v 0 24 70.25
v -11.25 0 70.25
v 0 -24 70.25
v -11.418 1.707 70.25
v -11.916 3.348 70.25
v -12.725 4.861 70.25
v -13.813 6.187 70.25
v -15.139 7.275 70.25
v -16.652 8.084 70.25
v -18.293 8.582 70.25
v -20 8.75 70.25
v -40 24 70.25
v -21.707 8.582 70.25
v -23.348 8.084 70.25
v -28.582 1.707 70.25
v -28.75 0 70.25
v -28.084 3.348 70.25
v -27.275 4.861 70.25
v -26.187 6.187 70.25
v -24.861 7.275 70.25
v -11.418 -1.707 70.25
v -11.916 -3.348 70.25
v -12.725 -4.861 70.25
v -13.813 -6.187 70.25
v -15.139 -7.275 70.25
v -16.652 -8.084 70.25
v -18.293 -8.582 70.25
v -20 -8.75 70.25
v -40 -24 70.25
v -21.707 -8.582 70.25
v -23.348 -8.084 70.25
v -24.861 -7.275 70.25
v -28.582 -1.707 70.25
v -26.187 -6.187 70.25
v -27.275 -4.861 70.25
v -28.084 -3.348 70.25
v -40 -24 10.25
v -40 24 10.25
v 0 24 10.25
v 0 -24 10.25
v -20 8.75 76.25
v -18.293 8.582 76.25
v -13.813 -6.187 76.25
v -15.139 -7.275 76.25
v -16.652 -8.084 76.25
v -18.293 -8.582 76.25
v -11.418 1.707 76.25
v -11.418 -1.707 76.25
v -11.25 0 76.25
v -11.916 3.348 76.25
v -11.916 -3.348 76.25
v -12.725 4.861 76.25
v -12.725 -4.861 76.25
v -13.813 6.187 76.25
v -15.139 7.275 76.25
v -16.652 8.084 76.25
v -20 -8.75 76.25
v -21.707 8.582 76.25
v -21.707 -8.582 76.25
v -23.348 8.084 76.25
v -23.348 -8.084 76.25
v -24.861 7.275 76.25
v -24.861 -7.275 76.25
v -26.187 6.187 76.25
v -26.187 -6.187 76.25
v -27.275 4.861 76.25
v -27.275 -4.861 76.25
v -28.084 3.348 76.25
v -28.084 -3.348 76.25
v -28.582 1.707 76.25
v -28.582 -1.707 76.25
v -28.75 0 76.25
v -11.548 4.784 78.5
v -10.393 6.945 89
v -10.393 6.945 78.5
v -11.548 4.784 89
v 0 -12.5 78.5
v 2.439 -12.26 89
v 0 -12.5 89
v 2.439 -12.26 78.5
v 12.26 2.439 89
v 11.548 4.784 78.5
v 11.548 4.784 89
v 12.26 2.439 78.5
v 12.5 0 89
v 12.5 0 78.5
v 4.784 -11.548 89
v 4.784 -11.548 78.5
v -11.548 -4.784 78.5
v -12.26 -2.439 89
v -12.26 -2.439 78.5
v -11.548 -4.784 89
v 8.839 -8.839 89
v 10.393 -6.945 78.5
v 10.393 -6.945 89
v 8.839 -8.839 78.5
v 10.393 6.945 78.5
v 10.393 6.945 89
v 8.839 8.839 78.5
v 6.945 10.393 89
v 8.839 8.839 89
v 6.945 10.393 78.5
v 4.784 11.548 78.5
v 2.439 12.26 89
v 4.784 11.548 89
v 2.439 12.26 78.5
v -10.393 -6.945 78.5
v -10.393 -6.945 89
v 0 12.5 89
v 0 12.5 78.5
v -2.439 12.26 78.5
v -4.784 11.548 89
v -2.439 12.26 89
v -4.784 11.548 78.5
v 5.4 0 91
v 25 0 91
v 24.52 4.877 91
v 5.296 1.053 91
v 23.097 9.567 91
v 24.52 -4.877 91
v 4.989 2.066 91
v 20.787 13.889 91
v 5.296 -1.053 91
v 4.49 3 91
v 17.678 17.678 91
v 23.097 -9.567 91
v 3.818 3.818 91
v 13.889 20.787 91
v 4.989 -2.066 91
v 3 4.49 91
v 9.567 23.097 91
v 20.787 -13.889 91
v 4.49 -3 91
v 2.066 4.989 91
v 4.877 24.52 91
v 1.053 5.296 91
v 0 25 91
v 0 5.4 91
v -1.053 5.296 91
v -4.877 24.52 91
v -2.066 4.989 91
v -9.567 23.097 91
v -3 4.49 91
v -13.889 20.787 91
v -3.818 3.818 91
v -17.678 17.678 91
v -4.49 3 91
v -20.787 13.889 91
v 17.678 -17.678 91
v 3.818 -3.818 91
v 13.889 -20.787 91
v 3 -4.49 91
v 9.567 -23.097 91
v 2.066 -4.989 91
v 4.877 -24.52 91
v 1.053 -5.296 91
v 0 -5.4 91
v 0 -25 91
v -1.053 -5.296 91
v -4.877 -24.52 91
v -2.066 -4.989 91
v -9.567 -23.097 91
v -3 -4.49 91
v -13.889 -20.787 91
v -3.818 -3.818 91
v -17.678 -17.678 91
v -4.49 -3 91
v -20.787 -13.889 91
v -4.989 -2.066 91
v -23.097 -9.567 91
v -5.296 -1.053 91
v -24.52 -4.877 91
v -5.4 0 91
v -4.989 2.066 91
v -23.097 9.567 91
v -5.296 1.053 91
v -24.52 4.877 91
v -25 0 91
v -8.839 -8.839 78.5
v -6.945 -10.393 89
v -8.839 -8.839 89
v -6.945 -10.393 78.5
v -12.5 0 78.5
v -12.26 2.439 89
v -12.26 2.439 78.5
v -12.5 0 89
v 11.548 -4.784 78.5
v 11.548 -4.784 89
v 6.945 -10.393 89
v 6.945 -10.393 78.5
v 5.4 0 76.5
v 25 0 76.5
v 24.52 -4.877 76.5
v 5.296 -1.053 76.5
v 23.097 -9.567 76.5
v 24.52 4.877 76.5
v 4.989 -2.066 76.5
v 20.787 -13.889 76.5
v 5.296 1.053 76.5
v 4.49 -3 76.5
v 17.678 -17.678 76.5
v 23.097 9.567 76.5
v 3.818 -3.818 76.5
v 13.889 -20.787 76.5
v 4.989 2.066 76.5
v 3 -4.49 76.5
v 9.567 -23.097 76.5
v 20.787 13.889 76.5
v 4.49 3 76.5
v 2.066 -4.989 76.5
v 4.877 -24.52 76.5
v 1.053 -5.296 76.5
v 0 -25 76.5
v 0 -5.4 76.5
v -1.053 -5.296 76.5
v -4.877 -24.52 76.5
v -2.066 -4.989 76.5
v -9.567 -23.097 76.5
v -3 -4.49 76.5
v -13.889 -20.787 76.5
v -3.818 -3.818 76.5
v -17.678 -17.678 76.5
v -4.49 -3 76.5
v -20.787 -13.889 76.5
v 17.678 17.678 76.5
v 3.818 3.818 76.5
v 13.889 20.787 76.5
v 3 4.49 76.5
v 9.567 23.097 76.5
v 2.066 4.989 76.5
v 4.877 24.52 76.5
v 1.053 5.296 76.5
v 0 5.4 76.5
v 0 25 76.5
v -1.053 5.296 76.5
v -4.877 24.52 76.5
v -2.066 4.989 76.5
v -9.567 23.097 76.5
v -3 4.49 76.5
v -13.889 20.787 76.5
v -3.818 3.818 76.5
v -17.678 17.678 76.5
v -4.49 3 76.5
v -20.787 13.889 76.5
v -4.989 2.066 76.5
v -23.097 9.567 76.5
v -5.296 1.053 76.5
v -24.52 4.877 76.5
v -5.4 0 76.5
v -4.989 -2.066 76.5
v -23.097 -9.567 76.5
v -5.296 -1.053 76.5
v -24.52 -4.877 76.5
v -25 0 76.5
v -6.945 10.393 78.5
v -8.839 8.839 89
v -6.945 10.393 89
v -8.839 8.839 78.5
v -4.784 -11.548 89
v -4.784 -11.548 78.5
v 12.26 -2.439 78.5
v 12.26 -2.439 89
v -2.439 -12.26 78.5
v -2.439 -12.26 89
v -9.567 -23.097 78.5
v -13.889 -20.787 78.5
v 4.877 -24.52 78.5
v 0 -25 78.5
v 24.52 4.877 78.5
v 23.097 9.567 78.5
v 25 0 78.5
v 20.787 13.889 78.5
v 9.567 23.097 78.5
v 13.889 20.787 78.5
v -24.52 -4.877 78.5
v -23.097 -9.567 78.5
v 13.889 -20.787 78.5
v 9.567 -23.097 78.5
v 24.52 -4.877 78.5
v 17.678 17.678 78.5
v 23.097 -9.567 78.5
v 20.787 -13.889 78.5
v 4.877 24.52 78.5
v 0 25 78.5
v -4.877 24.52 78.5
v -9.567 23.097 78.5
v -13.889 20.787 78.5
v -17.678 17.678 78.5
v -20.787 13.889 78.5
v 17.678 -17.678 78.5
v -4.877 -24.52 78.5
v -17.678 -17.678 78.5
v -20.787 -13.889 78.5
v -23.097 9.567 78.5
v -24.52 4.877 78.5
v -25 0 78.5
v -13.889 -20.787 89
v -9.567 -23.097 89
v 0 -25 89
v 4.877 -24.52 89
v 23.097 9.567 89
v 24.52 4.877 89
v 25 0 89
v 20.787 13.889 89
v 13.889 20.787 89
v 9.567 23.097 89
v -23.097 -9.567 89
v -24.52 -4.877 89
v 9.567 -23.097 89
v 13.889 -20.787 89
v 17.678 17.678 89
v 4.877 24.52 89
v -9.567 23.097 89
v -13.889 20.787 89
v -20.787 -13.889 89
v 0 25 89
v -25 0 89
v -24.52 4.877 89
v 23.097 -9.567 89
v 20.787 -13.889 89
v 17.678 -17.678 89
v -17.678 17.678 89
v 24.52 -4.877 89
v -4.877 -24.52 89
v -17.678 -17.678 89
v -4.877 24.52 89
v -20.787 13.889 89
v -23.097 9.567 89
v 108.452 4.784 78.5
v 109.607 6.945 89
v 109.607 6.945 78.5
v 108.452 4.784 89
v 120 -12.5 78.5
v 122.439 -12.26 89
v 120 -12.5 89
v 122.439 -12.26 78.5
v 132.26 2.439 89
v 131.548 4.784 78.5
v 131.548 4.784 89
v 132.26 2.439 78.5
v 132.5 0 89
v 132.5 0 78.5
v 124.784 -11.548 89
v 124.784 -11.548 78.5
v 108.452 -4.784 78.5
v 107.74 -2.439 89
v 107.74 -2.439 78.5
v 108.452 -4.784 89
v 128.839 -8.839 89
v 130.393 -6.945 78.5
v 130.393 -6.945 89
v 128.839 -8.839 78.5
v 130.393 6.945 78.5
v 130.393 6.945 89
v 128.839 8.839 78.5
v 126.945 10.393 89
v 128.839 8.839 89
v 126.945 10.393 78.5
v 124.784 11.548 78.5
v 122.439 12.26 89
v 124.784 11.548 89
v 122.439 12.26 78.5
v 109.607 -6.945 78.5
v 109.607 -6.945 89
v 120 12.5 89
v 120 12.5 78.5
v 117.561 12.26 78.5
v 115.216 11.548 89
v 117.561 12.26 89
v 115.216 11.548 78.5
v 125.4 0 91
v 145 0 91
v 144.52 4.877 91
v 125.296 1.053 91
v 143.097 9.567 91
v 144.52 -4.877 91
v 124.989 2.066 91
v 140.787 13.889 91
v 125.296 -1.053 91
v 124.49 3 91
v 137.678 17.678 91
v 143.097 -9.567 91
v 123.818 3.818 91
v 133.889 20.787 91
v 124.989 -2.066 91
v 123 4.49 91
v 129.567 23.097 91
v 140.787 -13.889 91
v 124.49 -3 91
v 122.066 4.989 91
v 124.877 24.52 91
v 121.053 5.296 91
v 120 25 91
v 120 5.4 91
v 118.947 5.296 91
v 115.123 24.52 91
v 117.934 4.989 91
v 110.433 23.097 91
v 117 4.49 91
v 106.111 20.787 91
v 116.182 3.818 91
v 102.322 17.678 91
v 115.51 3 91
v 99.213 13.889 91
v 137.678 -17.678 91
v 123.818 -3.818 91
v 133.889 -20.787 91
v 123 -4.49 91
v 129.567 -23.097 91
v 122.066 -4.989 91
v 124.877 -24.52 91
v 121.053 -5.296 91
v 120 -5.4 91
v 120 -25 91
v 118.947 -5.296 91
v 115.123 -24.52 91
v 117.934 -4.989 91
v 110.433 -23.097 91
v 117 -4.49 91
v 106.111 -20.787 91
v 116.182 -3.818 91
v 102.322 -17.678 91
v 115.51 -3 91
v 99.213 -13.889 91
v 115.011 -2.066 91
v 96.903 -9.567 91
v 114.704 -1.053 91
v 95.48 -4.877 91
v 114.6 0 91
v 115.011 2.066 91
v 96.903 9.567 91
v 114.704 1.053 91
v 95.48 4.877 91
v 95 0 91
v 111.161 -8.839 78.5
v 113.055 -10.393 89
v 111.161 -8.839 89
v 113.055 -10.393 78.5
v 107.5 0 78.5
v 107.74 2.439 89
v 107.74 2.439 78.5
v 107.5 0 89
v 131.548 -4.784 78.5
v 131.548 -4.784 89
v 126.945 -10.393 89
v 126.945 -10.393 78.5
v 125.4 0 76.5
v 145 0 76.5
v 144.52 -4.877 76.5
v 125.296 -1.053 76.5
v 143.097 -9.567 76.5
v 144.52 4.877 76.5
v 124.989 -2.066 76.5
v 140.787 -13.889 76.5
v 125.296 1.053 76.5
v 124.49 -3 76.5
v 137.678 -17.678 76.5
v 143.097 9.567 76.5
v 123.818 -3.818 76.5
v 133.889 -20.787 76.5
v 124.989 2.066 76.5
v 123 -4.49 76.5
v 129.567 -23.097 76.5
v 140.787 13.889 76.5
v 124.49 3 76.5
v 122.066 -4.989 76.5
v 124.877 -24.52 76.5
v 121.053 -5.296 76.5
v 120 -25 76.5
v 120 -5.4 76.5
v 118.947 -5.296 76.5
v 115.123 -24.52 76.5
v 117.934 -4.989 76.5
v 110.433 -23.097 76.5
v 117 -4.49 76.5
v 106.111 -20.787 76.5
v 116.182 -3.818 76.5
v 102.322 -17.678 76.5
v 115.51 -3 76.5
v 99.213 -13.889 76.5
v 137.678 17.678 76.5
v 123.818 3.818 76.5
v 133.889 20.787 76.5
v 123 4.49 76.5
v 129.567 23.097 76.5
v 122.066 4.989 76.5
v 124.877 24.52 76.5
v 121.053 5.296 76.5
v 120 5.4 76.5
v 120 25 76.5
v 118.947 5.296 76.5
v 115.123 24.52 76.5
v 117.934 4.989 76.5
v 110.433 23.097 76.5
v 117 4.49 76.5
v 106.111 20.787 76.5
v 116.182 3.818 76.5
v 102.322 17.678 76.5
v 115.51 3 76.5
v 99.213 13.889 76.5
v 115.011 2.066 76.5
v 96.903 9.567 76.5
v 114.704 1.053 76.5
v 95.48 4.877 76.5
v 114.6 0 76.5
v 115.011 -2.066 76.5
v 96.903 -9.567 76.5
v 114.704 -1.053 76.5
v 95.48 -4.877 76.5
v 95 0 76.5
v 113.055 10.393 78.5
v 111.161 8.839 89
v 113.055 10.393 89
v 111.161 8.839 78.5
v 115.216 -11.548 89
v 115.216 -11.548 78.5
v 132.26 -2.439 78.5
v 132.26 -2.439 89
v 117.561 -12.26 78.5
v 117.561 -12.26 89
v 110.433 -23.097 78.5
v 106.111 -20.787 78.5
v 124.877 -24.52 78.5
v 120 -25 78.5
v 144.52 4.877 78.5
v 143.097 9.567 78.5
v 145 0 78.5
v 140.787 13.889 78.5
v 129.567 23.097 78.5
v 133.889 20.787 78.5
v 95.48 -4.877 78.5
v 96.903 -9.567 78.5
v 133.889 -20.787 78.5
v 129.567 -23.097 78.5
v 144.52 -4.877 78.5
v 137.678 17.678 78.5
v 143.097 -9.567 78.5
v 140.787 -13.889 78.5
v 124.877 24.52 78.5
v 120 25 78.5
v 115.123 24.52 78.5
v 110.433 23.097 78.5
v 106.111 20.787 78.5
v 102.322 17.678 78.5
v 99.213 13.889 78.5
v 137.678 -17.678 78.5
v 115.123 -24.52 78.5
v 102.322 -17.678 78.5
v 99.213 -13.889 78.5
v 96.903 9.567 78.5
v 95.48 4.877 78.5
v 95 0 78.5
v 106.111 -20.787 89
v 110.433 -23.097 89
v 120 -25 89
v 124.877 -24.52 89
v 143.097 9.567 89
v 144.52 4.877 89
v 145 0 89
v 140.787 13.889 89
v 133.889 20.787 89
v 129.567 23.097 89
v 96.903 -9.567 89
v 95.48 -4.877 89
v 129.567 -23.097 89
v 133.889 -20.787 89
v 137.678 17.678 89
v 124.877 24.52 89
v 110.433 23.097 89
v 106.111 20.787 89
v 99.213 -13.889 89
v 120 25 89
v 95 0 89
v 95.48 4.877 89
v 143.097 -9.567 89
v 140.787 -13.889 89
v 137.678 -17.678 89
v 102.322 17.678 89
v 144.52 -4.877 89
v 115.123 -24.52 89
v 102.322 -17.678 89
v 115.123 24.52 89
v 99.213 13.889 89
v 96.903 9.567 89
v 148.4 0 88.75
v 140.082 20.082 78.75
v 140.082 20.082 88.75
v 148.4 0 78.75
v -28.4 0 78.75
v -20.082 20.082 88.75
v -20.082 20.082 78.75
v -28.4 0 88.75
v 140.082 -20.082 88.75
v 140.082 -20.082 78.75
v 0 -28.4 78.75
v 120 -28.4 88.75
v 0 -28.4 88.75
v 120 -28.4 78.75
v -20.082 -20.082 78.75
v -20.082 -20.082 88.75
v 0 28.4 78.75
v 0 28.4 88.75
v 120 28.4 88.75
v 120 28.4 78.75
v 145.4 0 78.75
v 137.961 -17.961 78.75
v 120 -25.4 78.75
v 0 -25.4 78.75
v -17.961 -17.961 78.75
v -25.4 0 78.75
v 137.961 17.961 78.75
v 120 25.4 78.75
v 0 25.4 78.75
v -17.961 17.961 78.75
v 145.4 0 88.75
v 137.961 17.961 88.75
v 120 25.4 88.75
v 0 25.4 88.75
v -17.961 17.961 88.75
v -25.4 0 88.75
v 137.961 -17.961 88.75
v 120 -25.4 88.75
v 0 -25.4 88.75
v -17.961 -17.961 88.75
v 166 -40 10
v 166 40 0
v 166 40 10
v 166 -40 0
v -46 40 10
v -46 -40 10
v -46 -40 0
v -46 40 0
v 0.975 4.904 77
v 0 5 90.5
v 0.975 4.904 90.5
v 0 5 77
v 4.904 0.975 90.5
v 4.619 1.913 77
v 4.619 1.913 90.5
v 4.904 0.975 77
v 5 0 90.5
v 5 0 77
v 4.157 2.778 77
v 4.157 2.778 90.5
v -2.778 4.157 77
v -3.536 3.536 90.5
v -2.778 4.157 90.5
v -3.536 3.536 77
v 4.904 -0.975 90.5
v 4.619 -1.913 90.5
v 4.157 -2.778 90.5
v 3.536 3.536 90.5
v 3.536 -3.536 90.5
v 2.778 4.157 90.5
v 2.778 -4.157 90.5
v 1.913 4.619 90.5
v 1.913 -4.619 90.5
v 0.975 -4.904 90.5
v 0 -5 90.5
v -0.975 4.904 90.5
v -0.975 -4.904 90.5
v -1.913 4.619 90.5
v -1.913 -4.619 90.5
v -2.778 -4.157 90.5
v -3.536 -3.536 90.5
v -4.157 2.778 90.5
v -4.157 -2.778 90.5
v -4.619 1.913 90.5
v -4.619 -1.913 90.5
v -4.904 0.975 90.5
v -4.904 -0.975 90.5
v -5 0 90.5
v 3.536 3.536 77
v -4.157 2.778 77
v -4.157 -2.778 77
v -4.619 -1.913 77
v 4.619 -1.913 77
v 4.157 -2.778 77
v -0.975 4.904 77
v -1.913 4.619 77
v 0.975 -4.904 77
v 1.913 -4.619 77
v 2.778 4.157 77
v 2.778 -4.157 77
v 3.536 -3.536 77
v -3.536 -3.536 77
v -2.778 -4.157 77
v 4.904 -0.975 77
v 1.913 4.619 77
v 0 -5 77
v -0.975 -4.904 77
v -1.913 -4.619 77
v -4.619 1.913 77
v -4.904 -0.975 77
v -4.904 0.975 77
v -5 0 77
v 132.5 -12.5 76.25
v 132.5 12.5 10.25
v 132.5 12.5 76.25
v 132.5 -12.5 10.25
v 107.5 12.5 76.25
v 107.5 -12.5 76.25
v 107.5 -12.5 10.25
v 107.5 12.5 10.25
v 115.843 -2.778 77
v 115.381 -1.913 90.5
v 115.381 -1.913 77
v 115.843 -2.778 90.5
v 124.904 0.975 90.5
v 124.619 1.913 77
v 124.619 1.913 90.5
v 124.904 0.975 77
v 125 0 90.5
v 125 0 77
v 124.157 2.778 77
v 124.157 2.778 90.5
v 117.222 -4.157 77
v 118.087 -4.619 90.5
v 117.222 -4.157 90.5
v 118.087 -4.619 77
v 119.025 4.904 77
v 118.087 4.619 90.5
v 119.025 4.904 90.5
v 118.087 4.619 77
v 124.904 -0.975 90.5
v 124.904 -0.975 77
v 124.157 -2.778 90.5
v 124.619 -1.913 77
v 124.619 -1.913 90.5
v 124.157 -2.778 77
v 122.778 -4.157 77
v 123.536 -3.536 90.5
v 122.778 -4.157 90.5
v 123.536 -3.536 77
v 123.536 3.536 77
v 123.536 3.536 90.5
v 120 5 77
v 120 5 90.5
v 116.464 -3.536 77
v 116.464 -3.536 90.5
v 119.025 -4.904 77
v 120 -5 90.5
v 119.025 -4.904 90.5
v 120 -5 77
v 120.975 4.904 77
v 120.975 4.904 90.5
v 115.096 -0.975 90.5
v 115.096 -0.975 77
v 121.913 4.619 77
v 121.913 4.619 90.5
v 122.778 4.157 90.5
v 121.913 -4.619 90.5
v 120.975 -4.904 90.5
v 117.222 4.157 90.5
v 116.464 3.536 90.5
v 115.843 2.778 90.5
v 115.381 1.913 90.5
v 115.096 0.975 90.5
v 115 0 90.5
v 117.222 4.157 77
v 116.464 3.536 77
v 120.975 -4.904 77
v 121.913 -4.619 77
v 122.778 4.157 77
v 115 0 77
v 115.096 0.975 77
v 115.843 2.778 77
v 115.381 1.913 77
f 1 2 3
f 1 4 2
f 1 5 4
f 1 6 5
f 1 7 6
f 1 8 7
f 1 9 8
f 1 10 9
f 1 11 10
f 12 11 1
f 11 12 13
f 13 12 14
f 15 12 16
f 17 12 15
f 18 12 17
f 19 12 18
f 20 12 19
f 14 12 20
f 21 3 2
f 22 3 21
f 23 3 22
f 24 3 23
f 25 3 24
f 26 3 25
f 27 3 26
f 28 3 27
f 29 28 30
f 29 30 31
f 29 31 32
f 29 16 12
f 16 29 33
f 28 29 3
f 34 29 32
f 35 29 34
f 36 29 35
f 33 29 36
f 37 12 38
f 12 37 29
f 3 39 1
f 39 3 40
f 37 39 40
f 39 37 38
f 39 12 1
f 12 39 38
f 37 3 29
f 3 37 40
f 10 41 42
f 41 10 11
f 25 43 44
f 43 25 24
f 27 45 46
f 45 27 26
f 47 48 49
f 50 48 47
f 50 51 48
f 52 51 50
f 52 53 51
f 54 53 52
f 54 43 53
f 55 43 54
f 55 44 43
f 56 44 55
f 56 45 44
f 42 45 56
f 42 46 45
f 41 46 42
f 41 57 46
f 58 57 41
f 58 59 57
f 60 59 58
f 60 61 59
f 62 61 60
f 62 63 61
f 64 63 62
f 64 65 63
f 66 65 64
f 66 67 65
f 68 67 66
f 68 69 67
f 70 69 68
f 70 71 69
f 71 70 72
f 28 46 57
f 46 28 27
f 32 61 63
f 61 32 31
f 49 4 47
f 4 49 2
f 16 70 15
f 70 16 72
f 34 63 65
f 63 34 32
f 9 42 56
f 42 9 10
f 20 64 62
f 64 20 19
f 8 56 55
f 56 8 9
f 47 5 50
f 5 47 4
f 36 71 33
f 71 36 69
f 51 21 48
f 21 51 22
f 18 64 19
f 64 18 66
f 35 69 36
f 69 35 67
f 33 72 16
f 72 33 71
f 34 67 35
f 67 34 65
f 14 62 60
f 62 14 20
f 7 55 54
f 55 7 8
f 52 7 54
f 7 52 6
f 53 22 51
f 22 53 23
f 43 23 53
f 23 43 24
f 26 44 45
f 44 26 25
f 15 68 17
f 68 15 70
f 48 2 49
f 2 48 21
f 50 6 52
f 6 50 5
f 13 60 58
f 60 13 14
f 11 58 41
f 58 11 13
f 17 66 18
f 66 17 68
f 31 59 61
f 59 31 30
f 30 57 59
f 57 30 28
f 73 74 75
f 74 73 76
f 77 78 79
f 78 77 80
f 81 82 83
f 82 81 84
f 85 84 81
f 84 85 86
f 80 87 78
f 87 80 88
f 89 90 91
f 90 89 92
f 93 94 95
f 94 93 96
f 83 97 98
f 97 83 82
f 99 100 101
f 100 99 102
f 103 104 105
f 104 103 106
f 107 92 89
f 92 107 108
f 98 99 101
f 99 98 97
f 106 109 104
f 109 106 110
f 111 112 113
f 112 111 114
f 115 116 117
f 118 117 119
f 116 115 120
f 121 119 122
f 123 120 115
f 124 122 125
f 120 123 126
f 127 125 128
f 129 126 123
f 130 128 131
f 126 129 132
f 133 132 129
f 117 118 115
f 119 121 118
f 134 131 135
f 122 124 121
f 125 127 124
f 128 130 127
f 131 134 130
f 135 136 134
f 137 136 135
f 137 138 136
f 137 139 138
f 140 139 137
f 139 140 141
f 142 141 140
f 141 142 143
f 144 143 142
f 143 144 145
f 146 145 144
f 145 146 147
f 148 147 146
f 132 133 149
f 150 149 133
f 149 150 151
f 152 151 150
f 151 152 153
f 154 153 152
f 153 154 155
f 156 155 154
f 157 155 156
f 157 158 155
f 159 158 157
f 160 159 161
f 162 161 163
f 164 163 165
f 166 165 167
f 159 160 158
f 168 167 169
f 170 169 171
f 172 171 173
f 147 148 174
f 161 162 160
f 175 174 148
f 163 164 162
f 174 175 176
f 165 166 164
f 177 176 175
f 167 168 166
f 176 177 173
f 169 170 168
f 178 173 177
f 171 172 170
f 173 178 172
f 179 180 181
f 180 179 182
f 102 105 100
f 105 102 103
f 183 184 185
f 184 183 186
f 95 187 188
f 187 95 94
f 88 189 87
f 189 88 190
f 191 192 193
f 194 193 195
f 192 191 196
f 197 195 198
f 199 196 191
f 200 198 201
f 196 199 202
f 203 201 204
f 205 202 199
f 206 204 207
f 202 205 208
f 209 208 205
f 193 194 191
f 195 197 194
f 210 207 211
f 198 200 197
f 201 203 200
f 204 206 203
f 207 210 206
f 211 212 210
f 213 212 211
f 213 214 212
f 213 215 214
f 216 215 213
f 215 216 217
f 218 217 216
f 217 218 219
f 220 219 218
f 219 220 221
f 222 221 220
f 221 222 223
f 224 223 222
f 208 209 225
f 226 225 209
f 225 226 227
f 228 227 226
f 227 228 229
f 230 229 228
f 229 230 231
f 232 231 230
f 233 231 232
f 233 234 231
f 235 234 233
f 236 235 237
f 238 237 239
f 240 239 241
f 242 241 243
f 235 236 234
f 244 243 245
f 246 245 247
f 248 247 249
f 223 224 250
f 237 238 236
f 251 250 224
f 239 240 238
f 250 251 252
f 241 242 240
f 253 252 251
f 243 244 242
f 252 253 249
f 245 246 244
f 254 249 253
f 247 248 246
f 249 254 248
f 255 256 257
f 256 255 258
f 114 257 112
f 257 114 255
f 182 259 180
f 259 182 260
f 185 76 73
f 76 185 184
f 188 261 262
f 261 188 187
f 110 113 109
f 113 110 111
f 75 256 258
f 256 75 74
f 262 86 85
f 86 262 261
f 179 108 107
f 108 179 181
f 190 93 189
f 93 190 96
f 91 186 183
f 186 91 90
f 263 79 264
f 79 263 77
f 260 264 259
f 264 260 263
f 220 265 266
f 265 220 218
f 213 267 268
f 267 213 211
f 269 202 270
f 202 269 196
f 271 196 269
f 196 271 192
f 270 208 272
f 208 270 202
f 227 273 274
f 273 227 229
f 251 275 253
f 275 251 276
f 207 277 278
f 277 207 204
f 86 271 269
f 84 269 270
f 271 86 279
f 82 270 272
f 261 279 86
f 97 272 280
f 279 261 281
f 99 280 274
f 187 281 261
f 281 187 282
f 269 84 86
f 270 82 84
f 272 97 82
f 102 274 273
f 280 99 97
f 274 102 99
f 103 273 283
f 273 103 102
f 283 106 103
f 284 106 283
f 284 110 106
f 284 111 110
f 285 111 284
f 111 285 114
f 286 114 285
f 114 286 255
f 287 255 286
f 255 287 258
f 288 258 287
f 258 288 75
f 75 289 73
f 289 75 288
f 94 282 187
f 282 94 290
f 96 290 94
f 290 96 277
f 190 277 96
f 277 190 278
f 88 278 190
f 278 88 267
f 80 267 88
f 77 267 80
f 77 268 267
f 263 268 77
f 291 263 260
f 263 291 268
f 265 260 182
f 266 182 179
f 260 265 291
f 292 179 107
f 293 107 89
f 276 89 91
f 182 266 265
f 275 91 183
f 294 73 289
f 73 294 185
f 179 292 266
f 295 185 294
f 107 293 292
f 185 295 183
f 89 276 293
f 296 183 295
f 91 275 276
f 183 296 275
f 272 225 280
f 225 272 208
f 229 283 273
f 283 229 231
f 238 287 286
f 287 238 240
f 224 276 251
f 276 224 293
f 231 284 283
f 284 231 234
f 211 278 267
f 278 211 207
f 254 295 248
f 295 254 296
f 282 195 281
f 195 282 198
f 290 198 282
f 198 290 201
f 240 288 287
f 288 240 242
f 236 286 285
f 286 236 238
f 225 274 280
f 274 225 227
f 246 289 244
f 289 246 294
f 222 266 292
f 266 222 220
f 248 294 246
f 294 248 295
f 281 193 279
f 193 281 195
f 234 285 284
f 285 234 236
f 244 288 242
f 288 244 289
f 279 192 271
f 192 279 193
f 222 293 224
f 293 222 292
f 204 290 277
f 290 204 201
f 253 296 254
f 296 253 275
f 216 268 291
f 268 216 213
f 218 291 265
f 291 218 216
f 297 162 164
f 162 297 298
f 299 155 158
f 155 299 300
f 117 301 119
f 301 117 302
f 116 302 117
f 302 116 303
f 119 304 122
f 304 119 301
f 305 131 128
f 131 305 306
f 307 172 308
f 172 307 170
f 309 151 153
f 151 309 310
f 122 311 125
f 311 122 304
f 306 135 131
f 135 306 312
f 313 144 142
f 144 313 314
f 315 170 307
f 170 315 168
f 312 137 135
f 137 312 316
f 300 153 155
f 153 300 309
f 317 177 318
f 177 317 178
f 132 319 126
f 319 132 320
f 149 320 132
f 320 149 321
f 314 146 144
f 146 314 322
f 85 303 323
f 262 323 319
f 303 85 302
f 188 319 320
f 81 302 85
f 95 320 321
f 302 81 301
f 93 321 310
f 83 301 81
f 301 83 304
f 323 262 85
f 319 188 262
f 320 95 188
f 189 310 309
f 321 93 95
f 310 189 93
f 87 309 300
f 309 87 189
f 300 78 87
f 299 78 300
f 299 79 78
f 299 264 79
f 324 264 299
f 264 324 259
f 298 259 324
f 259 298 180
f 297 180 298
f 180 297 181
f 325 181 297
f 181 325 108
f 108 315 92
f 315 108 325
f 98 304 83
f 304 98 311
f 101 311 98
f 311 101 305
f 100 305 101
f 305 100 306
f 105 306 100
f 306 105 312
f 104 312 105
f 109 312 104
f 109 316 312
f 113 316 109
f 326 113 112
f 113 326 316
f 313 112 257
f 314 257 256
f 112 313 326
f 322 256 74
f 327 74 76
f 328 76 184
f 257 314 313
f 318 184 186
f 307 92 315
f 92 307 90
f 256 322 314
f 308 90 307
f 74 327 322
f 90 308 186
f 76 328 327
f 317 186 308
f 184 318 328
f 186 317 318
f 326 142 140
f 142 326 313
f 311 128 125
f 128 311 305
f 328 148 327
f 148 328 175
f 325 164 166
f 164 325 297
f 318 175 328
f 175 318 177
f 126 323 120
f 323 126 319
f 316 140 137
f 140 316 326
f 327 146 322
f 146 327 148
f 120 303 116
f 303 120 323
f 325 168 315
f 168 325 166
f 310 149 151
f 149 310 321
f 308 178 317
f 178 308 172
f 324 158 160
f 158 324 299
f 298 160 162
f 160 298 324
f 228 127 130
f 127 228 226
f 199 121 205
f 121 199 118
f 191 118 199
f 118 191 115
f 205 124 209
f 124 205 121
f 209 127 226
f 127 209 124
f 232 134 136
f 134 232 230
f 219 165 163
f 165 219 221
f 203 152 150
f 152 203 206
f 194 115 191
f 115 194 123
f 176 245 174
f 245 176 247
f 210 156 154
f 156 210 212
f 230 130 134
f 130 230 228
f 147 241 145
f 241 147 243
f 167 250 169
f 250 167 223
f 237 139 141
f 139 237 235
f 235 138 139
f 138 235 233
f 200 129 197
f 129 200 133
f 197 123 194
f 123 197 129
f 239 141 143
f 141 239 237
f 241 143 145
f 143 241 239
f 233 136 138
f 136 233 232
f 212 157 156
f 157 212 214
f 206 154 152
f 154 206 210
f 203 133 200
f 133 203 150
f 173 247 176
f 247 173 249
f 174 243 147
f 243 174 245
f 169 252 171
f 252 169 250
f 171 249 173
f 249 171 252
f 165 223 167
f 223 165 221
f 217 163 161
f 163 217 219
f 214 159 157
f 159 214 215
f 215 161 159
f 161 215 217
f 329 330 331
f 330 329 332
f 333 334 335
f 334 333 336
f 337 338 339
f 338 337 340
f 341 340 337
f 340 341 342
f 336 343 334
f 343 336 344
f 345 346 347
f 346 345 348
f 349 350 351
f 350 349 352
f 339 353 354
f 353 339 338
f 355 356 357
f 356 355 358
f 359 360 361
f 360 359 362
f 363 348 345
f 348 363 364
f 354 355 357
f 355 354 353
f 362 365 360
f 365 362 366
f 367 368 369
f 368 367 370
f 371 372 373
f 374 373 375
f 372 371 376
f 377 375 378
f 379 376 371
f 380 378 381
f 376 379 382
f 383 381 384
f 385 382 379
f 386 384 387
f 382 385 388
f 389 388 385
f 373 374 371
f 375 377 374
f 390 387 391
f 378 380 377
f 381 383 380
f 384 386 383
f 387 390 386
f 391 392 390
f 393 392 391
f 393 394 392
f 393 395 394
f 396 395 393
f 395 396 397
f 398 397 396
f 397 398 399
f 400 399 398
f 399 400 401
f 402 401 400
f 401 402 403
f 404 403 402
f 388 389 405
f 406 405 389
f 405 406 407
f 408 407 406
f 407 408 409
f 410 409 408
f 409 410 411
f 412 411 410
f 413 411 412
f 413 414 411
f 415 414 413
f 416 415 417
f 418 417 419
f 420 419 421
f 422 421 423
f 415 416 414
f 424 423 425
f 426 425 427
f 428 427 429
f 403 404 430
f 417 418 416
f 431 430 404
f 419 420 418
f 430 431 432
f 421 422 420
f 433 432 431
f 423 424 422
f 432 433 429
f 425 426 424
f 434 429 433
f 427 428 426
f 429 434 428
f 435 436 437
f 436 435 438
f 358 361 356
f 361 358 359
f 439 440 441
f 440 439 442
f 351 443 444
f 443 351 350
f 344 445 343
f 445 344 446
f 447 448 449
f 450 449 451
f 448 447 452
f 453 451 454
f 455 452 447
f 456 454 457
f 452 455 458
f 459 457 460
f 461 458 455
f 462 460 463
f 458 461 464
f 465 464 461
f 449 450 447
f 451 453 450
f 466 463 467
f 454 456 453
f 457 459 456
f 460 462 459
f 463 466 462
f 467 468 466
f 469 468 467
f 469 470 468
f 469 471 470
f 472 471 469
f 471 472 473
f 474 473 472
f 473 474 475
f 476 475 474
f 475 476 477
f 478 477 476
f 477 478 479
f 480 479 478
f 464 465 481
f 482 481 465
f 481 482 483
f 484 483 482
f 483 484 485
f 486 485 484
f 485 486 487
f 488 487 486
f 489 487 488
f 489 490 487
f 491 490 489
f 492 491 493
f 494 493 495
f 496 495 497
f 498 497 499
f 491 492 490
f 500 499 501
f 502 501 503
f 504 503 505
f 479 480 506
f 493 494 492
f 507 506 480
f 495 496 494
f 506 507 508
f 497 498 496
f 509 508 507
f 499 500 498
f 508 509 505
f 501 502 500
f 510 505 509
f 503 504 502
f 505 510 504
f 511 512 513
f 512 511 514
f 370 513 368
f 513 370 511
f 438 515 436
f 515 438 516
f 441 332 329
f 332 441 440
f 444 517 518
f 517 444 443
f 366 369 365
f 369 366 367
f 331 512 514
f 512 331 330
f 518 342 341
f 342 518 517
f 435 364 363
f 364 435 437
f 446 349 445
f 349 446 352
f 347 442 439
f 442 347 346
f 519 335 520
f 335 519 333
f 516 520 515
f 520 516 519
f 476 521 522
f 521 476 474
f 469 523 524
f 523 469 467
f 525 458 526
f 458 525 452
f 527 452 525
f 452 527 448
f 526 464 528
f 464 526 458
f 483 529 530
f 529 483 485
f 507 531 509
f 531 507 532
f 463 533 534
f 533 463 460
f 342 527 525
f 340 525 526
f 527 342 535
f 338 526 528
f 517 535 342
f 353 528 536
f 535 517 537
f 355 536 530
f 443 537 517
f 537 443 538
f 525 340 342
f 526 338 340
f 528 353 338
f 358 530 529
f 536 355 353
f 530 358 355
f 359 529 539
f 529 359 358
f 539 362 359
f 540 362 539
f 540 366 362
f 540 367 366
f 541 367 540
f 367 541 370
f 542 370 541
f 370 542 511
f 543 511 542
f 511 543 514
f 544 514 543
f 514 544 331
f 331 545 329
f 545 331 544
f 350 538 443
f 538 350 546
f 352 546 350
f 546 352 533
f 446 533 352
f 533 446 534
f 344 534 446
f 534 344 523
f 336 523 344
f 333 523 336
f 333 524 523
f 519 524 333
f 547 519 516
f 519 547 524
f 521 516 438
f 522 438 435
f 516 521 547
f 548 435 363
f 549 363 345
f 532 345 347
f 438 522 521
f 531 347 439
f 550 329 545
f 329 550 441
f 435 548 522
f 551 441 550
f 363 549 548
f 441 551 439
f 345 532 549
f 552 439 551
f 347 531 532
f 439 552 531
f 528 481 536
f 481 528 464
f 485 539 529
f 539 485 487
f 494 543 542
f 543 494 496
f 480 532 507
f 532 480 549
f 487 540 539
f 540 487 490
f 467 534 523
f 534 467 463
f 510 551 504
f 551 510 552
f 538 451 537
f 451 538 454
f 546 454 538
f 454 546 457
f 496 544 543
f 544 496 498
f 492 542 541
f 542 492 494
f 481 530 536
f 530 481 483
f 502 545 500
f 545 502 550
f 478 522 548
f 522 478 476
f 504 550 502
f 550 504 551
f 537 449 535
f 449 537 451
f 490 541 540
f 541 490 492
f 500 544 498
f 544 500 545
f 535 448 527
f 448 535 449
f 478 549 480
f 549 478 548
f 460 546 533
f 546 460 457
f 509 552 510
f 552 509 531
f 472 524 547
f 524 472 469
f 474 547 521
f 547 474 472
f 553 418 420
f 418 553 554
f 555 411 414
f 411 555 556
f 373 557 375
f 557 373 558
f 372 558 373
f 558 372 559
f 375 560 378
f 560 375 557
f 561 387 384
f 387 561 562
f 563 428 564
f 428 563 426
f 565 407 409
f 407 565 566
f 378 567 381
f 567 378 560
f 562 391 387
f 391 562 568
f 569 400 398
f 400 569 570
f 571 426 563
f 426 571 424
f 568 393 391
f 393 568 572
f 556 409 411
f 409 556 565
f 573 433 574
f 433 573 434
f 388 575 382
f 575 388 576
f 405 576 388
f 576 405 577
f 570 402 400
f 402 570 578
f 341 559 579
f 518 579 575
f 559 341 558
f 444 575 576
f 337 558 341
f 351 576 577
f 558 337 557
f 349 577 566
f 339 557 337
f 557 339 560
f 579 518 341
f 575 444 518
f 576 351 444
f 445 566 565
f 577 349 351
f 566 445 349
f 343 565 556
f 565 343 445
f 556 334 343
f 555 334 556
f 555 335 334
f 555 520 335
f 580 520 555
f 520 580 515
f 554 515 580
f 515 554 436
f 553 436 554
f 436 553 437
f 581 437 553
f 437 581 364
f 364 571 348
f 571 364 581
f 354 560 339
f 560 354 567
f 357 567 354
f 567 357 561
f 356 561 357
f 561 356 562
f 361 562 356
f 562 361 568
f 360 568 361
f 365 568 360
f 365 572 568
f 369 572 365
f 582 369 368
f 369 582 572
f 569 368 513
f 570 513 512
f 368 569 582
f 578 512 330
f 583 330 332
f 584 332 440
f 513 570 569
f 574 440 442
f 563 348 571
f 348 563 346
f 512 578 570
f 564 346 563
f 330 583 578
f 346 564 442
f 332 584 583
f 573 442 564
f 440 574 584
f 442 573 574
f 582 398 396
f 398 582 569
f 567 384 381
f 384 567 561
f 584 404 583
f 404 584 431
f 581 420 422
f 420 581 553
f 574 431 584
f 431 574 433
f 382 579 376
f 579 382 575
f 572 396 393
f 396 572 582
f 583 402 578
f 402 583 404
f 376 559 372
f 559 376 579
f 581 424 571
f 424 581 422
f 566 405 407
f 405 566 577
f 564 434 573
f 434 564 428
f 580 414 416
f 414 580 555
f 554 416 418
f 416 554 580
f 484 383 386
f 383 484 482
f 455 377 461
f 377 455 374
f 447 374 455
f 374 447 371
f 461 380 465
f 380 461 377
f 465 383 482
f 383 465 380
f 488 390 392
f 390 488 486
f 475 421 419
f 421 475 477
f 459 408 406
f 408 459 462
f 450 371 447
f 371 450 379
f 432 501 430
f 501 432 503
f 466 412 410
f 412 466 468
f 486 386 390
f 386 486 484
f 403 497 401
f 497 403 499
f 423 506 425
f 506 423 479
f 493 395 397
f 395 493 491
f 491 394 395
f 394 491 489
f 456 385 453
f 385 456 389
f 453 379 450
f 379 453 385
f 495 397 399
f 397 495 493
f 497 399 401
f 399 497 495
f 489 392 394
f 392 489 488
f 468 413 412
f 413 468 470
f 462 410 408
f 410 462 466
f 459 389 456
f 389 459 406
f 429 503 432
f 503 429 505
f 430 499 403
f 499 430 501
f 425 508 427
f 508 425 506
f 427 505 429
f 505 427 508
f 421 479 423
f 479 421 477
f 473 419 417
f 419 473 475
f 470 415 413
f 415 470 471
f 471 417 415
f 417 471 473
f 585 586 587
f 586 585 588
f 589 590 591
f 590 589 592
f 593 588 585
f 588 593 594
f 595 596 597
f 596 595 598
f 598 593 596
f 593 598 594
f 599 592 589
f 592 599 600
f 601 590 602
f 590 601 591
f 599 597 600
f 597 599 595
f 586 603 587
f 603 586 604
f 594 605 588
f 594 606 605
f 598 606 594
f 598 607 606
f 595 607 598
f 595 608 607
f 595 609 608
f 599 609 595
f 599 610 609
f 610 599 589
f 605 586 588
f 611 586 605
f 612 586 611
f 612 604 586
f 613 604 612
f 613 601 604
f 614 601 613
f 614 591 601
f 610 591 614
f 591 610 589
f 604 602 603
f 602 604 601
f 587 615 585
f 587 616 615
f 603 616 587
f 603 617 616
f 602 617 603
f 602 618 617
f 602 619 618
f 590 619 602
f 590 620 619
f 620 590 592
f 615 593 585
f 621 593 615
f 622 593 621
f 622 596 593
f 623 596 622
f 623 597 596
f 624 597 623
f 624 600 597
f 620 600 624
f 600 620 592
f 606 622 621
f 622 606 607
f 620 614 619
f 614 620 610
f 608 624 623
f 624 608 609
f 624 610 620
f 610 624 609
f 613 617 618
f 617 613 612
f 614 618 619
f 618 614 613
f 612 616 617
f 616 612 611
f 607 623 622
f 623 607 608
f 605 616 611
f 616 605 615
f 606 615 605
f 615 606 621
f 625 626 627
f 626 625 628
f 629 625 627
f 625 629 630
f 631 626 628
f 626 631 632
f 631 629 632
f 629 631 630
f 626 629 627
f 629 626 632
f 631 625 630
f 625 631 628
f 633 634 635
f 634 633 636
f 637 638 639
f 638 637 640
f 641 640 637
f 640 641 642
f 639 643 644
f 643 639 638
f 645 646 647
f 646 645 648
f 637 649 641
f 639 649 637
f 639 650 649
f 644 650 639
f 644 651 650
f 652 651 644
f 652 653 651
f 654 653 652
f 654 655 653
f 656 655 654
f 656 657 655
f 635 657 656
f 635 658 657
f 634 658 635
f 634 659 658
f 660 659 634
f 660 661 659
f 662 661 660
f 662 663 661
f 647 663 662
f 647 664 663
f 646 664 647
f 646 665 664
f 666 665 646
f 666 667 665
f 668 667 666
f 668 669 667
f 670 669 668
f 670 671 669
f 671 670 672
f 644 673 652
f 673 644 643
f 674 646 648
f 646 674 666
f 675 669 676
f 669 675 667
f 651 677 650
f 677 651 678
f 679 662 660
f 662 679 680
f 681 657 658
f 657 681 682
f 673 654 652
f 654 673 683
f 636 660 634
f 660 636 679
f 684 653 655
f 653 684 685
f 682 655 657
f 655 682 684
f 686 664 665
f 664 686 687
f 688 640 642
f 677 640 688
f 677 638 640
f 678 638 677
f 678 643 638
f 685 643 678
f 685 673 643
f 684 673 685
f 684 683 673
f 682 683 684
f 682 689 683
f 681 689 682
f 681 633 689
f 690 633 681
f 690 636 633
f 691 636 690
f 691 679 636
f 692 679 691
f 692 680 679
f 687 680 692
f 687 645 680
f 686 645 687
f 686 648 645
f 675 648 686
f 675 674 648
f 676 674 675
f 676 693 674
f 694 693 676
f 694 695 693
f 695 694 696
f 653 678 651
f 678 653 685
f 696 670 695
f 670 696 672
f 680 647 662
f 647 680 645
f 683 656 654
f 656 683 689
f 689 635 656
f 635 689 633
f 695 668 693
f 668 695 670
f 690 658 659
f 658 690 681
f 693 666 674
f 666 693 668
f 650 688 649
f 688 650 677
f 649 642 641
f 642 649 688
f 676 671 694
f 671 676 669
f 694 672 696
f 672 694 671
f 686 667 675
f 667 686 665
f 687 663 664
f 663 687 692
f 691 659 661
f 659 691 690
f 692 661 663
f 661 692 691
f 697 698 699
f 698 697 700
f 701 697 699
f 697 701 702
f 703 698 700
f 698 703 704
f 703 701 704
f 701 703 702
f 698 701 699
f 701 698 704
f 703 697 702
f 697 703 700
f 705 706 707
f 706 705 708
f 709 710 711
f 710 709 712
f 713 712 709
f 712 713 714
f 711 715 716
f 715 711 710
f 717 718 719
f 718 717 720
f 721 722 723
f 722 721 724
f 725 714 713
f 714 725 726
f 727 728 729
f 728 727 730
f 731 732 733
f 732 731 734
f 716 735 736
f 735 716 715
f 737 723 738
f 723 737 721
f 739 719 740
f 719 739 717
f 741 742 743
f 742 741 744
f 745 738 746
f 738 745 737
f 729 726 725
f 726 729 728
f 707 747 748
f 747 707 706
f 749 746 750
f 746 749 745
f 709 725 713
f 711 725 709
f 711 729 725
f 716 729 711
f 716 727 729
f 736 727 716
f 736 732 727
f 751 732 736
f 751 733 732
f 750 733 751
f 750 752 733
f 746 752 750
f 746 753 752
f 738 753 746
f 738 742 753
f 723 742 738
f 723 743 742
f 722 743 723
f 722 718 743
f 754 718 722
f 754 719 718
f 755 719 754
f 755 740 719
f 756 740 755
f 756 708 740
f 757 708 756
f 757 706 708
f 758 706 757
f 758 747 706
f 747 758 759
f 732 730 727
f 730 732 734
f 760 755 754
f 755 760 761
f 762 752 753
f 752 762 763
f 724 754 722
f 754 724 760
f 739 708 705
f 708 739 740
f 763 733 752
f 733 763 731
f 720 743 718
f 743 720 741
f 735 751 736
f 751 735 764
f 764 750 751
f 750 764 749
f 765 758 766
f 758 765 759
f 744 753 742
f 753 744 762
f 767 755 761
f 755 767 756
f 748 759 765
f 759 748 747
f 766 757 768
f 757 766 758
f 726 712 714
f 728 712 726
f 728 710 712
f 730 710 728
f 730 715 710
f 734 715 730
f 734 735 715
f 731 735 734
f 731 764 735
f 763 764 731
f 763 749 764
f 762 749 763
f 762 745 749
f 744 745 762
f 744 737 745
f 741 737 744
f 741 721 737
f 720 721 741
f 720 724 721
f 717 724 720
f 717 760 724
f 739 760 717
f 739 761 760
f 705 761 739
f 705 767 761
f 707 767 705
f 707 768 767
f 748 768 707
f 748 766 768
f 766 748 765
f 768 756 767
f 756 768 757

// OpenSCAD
$fn = 32;

// ------------------------------------------------------------------------
// Motor belt drive: span 120 mm, pulleys d50, belt 10 mm wide
// Every part is its own module, assembly() places every instance.
// ------------------------------------------------------------------------

// --- part 1 ---
module base_plate() {
  difference() {
    translate([-106, -40, 0]) cube([212, 80, 10]);
  }
}

// --- part 2 ---
module motor() {
  union() {
    translate([-30, -24, 0]) cube([60, 48, 40]);
    translate([33, 0, 20]) rotate([0, 90, 0]) cylinder(h = 6, d = 17.5, center = true);
  }
}

// --- part 3 ---
module drive_shaft() {
  translate([0, 0, -6.75]) cylinder(h = 13.5, d = 10);
}

// --- part 4 ---
module pulley_drive() {
  difference() {
    union() {
      cylinder(h = 14.5, d = 25);
      cylinder(h = 2, d = 50);
      translate([0, 0, 12.5]) cylinder(h = 2, d = 50);
    }
    translate([0, 0, -1]) cylinder(h = 16.5, d = 10.8);
  }
}

// --- part 5 ---
module idler_post() {
  translate([-12.5, -12.5, 0]) cube([25, 25, 66]);
}

// --- part 6 ---
module driven_shaft() {
  translate([0, 0, -6.75]) cylinder(h = 13.5, d = 10);
}

// --- part 7 ---
module pulley_driven() {
  difference() {
    union() {
      cylinder(h = 14.5, d = 25);
      cylinder(h = 2, d = 50);
      translate([0, 0, 12.5]) cylinder(h = 2, d = 50);
    }
    translate([0, 0, -1]) cylinder(h = 16.5, d = 10.8);
  }
}

// --- part 8 ---
module drive_belt() {
  difference() {
    linear_extrude(height = 10) polygon(points = concat([for (a = [90 : 45 : 270]) [28.4 * cos(a), 28.4 * sin(a)]], [for (a = [270 : 45 : 450]) [120 + 28.4 * cos(a), 28.4 * sin(a)]]));
    translate([0, 0, -1]) linear_extrude(height = 12) polygon(points = concat([for (a = [90 : 45 : 270]) [25.4 * cos(a), 25.4 * sin(a)]], [for (a = [270 : 45 : 450]) [120 + 25.4 * cos(a), 25.4 * sin(a)]]));
  }
}

// --- assembly ---
module assembly() {
  color([0.80, 0.24, 0.20]) translate([60, 0, 0]) rotate([0, 0, 0]) base_plate();
  color([0.20, 0.45, 0.75]) translate([0, 0, 40.25]) rotate([0, 270, 0]) motor();
  color([0.25, 0.62, 0.32]) translate([0, 0, 83.75]) rotate([0, 0, 0]) drive_shaft();
  color([0.92, 0.70, 0.18]) translate([0, 0, 76.5]) rotate([0, 0, 0]) pulley_drive();
  color([0.58, 0.35, 0.70]) translate([120, 0, 10.25]) rotate([0, 0, 0]) idler_post();
  color([0.16, 0.66, 0.66]) translate([120, 0, 83.75]) rotate([0, 0, 0]) driven_shaft();
  color([0.85, 0.48, 0.18]) translate([120, 0, 76.5]) rotate([0, 0, 0]) pulley_driven();
  color([0.55, 0.60, 0.65]) translate([0, 0, 78.75]) rotate([0, 0, 0]) drive_belt();
}

assembly();
